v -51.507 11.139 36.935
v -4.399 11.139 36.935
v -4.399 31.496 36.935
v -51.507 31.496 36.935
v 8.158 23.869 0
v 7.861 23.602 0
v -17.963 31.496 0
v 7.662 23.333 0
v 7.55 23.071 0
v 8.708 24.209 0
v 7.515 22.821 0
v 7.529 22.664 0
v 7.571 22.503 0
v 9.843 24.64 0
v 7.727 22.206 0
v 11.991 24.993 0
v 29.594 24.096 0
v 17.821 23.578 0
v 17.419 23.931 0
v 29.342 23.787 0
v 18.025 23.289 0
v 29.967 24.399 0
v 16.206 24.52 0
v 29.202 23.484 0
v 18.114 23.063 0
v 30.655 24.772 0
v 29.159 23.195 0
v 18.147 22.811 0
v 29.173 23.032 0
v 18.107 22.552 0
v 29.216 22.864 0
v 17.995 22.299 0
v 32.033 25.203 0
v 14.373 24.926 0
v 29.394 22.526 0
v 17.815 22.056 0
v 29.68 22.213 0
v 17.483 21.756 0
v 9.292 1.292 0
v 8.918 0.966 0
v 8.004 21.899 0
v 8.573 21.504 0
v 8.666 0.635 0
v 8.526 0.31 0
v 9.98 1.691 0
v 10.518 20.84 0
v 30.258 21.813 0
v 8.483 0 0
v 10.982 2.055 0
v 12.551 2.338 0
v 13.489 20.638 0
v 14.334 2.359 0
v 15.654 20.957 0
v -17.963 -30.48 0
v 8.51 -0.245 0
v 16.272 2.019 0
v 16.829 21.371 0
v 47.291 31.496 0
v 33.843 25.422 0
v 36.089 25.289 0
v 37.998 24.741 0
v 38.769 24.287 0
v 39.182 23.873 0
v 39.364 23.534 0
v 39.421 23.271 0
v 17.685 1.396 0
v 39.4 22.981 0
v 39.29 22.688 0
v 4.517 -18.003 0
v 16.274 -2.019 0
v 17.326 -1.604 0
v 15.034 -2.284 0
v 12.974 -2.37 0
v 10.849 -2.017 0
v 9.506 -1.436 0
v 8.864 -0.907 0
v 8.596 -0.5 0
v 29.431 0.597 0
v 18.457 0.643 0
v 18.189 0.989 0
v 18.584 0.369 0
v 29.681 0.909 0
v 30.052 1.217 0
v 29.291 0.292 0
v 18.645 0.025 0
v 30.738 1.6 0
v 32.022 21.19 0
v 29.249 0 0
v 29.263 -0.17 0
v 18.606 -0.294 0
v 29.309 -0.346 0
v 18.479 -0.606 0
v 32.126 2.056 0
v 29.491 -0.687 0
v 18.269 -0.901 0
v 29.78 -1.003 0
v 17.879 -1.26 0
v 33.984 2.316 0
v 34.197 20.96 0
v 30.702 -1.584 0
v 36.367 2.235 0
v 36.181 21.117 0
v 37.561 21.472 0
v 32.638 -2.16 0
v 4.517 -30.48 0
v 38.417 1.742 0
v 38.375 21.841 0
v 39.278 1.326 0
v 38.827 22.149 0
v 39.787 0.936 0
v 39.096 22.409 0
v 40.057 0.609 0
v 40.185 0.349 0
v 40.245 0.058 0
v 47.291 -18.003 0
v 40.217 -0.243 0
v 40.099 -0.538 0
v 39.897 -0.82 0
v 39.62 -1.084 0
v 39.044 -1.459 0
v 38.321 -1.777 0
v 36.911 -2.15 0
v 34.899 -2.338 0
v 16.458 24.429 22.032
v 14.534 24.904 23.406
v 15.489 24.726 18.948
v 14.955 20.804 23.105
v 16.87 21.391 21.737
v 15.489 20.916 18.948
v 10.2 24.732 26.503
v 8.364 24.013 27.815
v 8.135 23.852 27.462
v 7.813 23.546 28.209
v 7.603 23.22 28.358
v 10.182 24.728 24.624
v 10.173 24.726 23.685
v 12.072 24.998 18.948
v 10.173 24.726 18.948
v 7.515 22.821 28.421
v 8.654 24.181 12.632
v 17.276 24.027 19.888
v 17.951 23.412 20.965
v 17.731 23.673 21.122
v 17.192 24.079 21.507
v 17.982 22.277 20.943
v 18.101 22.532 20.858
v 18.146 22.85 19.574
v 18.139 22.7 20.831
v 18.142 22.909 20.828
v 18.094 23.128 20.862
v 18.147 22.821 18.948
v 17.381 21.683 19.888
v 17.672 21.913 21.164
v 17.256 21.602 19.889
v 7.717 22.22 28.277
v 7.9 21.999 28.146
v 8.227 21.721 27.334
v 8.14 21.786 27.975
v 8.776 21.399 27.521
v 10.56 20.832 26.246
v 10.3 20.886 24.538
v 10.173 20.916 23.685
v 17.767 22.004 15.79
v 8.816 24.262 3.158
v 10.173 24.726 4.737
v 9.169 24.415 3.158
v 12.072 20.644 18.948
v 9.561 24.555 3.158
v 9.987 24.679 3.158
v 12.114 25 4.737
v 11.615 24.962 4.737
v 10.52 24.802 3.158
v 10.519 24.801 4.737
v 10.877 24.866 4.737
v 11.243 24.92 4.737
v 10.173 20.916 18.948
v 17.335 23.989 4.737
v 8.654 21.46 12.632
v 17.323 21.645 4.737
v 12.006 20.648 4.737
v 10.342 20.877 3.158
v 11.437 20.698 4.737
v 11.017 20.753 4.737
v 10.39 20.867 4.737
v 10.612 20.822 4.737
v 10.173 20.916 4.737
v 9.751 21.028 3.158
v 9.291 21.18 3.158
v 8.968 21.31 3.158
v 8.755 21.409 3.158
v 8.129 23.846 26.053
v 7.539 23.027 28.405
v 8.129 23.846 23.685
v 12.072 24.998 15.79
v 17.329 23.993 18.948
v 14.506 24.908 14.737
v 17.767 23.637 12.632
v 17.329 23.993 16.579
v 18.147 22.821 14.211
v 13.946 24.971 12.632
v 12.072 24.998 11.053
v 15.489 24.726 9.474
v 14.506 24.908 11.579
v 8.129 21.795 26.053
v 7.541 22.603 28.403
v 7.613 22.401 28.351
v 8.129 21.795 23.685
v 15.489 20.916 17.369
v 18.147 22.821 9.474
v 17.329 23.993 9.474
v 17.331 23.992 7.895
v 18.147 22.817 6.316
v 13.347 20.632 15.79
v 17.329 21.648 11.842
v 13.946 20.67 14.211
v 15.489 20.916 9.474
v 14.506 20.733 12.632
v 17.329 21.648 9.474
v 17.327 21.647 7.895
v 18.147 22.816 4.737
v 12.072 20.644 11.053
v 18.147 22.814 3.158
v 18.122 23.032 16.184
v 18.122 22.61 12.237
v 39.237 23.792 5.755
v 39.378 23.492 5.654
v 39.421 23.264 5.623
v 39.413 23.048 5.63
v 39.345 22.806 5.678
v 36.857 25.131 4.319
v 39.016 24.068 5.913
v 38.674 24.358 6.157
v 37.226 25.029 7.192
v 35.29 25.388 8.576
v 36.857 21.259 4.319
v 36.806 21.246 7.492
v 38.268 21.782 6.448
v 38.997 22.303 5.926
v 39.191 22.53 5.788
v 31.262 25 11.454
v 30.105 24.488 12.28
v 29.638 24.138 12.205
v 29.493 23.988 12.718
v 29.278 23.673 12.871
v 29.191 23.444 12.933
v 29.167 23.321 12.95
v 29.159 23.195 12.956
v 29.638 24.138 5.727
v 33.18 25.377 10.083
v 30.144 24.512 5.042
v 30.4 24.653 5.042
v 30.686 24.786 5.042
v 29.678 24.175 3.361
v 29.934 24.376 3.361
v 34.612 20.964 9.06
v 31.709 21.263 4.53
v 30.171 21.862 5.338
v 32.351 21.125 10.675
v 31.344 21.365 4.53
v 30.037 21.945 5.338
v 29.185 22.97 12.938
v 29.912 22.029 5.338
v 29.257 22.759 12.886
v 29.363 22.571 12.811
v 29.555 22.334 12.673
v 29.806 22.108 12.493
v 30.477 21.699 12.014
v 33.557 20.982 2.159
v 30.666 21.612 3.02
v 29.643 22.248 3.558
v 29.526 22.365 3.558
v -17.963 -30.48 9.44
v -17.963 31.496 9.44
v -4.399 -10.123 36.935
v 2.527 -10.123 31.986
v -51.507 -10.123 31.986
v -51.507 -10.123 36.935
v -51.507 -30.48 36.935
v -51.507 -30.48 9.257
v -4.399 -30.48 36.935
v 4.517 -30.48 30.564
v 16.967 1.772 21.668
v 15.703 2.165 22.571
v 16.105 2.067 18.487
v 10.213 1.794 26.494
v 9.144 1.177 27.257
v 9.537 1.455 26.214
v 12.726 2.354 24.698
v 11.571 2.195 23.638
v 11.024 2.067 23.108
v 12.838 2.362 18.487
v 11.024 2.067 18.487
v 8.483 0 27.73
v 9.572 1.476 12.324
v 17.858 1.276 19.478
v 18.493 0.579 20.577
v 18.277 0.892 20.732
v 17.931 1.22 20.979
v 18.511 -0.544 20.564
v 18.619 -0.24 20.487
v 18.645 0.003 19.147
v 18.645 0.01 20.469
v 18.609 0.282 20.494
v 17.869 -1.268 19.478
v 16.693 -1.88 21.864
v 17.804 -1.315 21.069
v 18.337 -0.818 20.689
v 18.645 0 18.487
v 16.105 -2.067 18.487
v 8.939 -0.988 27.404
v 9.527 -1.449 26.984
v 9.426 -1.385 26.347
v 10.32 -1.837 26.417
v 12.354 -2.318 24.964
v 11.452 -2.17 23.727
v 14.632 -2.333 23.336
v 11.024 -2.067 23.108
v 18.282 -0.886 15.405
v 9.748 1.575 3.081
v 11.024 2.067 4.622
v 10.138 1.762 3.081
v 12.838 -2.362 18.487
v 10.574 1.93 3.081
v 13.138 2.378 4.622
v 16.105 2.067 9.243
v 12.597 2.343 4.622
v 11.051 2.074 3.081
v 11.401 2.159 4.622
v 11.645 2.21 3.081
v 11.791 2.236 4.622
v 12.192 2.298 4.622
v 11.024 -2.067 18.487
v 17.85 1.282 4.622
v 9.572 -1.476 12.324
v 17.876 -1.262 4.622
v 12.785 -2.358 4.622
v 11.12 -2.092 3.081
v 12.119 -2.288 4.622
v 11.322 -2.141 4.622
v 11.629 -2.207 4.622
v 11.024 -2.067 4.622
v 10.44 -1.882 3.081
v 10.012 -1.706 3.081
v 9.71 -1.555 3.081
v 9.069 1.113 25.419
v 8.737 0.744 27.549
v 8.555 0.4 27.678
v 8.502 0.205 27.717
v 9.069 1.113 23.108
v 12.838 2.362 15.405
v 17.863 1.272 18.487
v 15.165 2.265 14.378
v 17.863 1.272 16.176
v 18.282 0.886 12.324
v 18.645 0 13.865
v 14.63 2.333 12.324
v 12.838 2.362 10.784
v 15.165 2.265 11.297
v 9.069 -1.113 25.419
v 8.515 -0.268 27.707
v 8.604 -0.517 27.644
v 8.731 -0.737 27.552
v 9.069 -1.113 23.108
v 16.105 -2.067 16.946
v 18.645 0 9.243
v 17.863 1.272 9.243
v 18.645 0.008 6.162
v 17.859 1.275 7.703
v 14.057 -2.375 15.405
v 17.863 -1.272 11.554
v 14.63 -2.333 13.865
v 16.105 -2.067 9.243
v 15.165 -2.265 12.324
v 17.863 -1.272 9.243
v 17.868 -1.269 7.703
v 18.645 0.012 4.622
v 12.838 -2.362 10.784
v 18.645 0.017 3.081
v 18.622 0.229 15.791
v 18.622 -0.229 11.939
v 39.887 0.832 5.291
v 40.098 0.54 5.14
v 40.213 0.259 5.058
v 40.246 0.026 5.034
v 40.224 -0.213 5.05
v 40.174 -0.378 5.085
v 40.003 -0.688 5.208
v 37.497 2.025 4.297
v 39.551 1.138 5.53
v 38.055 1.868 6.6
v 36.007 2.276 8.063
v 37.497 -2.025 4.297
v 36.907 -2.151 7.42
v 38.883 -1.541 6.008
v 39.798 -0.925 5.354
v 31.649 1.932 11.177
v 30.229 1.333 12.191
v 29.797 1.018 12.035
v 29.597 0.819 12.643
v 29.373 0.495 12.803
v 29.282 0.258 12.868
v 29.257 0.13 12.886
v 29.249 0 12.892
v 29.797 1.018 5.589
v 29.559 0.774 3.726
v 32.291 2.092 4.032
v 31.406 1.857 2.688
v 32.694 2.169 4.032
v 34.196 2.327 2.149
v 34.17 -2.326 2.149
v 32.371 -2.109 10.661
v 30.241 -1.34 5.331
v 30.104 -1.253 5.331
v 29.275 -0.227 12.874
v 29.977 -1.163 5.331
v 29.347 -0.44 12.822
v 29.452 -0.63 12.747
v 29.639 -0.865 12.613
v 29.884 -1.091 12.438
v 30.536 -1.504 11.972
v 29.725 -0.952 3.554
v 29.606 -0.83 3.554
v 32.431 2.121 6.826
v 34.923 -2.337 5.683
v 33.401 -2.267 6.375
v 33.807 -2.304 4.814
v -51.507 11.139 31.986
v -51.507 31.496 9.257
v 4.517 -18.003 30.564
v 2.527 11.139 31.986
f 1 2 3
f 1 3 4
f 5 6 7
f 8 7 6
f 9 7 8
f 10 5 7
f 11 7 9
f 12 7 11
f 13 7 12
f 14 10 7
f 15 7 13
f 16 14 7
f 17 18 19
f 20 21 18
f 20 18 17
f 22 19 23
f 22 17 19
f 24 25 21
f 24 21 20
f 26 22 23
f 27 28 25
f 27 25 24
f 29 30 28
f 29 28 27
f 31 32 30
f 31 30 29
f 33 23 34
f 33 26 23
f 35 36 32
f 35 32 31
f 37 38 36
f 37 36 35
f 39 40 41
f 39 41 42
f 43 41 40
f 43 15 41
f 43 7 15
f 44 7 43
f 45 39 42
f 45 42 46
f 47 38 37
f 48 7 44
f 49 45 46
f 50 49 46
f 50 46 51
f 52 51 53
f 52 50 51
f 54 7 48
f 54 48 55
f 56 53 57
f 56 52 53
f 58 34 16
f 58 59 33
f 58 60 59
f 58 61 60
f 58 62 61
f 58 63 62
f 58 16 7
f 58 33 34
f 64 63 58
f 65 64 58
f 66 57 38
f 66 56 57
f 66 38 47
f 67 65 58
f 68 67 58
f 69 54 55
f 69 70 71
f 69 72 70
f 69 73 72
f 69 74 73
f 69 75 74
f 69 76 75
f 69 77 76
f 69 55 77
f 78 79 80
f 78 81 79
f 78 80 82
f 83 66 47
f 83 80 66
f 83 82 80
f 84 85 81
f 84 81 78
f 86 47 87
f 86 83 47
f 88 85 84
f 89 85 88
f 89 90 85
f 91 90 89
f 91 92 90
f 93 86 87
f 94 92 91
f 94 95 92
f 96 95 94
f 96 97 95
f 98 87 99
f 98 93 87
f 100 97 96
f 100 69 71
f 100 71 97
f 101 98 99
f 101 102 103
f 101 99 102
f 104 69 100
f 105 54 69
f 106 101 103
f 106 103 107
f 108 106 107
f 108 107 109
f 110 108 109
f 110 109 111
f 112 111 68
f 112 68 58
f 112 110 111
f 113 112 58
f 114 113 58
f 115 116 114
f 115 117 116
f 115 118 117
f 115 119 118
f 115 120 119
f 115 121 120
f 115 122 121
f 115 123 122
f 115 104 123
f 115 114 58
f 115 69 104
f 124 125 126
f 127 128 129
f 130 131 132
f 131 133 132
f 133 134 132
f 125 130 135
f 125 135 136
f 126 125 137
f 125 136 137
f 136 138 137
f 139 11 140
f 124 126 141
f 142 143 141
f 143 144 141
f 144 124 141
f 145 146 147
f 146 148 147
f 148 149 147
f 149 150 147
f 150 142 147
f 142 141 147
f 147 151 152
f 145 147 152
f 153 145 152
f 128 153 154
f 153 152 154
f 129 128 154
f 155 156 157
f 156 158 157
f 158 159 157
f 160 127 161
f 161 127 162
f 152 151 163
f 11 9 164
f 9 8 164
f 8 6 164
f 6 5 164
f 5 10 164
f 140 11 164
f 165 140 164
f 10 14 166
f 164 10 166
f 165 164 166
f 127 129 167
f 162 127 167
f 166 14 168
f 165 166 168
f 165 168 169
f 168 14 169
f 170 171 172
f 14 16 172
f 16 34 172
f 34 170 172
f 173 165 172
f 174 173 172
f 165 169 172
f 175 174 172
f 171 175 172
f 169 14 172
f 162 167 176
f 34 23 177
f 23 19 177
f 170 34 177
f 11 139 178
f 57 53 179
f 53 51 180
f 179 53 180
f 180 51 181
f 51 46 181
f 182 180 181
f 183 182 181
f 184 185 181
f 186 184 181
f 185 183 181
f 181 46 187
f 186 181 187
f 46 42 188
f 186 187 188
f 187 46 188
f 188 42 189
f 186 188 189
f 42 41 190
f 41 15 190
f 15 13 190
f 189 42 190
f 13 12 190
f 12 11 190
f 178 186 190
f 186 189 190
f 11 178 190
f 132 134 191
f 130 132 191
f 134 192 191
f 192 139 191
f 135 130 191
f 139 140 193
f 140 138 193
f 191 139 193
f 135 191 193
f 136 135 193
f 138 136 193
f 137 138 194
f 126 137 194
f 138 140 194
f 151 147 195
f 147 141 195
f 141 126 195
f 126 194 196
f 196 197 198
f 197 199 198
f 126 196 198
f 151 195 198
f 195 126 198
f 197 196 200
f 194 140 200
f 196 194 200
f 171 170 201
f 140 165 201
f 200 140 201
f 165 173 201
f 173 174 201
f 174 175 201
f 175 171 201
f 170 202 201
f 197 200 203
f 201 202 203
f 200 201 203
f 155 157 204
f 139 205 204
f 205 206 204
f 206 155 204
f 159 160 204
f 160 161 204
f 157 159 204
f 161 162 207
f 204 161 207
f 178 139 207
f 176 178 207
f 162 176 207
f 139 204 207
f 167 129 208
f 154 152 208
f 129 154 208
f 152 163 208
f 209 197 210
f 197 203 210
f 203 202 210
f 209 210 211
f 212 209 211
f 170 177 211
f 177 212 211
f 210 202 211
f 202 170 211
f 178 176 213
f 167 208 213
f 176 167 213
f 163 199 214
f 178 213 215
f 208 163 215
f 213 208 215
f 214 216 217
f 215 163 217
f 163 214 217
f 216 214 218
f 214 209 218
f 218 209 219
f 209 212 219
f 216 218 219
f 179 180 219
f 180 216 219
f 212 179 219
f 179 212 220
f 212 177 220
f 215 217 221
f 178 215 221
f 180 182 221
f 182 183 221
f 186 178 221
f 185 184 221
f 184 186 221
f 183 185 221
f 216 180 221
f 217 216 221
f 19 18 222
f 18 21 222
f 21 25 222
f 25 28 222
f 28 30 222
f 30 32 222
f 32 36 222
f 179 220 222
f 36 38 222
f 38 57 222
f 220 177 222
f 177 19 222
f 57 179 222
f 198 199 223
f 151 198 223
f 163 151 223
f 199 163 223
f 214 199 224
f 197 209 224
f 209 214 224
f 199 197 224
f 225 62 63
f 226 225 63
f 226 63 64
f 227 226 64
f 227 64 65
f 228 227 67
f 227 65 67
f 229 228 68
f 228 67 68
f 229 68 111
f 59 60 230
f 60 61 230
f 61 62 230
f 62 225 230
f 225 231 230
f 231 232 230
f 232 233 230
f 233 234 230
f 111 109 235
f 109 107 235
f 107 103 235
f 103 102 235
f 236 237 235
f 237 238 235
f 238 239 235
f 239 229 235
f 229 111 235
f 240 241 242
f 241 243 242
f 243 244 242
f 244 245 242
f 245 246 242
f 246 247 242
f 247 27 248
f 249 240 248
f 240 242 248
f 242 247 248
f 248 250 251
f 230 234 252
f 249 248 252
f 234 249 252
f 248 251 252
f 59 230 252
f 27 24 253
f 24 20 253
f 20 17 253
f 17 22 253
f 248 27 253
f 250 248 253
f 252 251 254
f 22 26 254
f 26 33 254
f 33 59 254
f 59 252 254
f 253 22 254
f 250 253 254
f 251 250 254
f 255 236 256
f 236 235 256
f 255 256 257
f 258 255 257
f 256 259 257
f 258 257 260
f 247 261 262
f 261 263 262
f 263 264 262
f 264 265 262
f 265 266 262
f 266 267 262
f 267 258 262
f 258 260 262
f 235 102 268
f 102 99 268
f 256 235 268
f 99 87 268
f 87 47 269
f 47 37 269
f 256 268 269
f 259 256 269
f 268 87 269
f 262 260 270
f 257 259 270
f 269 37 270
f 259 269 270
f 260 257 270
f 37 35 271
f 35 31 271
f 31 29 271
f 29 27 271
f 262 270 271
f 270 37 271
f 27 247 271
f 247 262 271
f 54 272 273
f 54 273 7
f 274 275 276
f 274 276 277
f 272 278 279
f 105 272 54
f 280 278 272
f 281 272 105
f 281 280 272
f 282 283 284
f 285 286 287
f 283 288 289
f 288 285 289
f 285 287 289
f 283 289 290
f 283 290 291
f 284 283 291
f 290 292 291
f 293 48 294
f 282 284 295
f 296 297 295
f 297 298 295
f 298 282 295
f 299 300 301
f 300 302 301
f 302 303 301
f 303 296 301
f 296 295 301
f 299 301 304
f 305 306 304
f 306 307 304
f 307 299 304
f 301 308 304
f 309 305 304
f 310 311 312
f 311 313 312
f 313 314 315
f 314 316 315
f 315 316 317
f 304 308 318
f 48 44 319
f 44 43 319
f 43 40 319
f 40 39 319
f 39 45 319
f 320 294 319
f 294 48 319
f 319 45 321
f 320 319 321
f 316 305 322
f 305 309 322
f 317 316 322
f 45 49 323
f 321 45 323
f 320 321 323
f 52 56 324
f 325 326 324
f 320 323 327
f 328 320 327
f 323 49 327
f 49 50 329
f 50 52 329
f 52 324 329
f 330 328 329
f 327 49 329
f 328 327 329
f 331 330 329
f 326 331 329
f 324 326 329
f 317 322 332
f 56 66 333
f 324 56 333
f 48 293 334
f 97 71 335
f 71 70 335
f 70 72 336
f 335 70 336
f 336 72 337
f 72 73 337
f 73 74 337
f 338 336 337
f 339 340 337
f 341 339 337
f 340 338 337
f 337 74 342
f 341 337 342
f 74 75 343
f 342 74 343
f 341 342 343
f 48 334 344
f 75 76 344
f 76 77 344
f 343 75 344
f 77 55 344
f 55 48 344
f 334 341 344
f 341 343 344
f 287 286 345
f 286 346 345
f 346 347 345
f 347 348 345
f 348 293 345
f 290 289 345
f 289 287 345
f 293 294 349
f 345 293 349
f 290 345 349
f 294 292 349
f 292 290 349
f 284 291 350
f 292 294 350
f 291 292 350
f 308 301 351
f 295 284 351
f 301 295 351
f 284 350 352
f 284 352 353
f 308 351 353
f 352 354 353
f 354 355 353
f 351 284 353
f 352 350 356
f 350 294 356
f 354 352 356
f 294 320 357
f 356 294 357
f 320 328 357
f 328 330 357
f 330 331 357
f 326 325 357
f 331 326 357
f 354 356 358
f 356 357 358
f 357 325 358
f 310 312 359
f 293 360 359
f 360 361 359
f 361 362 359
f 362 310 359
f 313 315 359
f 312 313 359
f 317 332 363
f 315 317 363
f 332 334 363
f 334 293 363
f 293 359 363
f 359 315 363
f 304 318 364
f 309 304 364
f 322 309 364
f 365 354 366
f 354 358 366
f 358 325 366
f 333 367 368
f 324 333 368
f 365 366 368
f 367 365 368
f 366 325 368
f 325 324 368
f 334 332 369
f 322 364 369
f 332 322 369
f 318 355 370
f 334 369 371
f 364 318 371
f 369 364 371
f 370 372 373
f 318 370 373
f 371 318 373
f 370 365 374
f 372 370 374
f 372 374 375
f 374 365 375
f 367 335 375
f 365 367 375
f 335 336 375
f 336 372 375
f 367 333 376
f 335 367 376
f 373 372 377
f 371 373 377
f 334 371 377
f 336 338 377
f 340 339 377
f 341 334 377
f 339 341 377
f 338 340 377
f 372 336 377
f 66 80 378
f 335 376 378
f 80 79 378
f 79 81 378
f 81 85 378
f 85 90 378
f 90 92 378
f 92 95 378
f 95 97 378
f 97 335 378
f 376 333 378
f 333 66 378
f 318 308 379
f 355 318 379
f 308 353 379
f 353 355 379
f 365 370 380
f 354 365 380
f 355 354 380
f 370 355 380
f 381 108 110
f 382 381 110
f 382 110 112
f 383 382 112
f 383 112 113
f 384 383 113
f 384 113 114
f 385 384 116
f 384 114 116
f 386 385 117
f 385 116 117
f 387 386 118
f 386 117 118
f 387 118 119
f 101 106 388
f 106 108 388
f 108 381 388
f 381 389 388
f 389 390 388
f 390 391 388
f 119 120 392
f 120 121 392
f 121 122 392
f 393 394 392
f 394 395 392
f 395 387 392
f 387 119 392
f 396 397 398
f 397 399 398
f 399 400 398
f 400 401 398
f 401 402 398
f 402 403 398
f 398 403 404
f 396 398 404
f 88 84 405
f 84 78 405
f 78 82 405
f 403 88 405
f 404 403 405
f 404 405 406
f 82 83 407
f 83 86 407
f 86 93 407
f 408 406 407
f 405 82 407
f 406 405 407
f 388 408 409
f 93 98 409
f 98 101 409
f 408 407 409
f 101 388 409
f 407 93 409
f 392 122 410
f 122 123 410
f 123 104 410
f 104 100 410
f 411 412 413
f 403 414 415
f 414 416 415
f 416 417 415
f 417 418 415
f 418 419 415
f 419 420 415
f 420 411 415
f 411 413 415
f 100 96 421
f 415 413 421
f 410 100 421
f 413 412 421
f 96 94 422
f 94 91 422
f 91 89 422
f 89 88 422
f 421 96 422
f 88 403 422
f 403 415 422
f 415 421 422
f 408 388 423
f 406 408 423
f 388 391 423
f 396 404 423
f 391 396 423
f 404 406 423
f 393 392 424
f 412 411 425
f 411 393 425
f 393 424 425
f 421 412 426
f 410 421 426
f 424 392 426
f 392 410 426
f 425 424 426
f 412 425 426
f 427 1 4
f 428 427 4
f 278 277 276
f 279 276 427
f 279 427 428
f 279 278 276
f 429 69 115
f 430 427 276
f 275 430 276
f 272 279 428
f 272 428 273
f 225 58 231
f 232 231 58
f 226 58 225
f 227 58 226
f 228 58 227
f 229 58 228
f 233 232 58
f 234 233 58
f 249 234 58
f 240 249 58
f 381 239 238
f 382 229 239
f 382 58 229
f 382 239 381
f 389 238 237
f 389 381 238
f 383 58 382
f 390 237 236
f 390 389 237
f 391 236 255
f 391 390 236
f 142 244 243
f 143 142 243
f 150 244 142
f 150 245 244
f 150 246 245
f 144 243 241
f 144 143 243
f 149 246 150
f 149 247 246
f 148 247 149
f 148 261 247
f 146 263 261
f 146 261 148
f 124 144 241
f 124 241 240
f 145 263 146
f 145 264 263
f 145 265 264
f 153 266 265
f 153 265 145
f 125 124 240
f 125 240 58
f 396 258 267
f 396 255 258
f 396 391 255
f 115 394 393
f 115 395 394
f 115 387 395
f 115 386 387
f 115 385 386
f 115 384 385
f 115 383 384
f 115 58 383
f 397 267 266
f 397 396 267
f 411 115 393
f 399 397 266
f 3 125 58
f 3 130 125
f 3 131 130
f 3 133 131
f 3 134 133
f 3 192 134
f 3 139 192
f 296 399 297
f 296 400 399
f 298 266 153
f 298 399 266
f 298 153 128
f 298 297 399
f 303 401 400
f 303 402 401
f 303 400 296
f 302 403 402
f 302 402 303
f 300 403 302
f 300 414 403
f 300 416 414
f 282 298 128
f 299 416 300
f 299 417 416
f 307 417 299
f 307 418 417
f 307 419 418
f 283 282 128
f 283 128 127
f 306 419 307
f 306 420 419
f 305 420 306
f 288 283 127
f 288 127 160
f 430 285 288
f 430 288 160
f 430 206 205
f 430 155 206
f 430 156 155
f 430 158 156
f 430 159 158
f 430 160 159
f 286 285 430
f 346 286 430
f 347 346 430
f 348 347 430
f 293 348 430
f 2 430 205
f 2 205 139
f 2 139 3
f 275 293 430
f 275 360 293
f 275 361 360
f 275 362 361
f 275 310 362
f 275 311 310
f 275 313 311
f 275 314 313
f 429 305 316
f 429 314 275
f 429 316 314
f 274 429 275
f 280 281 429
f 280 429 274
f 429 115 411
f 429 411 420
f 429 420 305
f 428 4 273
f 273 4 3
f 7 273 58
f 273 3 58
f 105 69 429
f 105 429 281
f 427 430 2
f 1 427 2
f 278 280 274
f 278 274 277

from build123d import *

# Parameters (mm, degrees)
F1_DEPTH      = 30.48
F1_DEPTH_BACK = 31.496
F2_W          = 21.2626811117
F2_H          = 4.9490742385
F3_DEPTH      = 62.23
F4_W          = 42.7741259336
F4_H          = 12.4774224401
F5_DEPTH      = 50.038
F7_DEPTH      = 40.386


with BuildPart() as f1:
    # F0 (on Front) → F1 (new body, two sides)
    with BuildSketch(Plane.XZ) as f1_sk:
        Polygon((-51.5070110559, 36.9347445667), (-51.5070110559, 9.2565976083), (-17.9632995278, 9.4398977235), (-17.9632995278, 0), (47.2911335528, 0), (-4.39917529, 36.9347445667), (-39.2259806395, 36.9347445667), align=None)
    extrude(amount=F1_DEPTH)
    extrude(f1_sk.sketch, amount=-F1_DEPTH_BACK)

    # F2 (on face) → F3 (cut)
    with BuildSketch(Plane(origin=(-51.5070110559, 0, 0), x_dir=(0, -1, 0), z_dir=(-1, 0, 0))):
        with Locations((-0.508, 34.4602074474)):
            Rectangle(F2_W, F2_H)
    extrude(amount=-F3_DEPTH, mode=Mode.SUBTRACT)

    # F4 (on face) → F5 (cut)
    with BuildSketch(Plane(origin=(0, 0, 0), x_dir=(1, 0, 0), z_dir=(0, 0, -1))):
        with Locations((25.904070586, 24.24128878)):
            Rectangle(F4_W, F4_H)
    extrude(amount=-F5_DEPTH, mode=Mode.SUBTRACT)

    # F6 (on face) → F7 (cut)
    with BuildSketch(Plane(origin=(0, 0, 0), x_dir=(1, 0, 0), z_dir=(0, 0, -1))):
        with BuildLine():
            add(Edge.make_bspline(
                [(8.4830916408, 0), (8.4830916408, -4.1333669656), (16.1046412347, -2.0666834828), (23.7261908286, 0), (16.1046412347, 2.0666834828), (8.4830916408, 4.1333669656), (8.4830916408, 0)],
                knots=[0, 0, 0, 2.0943951024, 2.0943951024, 4.1887902048, 4.1887902048, 6.2831853072, 6.2831853072, 6.2831853072], degree=2, weights=[1, 0.5, 1, 0.5, 1, 0.5, 1]))
        make_face()
        with BuildLine():
            add(Edge.make_bspline(
                [(7.5152562931, -22.8207223117), (7.5152562931, -26.6305194653), (15.4887624085, -24.7256208885), (23.4622685239, -22.8207223117), (15.4887624085, -20.9158237349), (7.5152562931, -19.0109251582), (7.5152562931, -22.8207223117)],
                knots=[0, 0, 0, 2.0943951024, 2.0943951024, 4.1887902048, 4.1887902048, 6.2831853072, 6.2831853072, 6.2831853072], degree=2, weights=[1, 0.5, 1, 0.5, 1, 0.5, 1]))
        make_face()
        with BuildLine():
            add(Edge.make_bspline(
                [(29.1589088738, -23.1949742883), (29.1589088738, -27.0670063105), (36.8574578315, -25.1309902994), (44.5560067892, -23.1949742883), (36.8574578315, -21.2589582773), (29.1589088738, -19.3229422662), (29.1589088738, -23.1949742883)],
                knots=[0, 0, 0, 2.0943951024, 2.0943951024, 4.1887902048, 4.1887902048, 6.2831853072, 6.2831853072, 6.2831853072], degree=2, weights=[1, 0.5, 1, 0.5, 1, 0.5, 1]))
        make_face()
        with BuildLine():
            add(Edge.make_bspline(
                [(29.2485039681, 0), (29.2485039681, -4.0503729429), (37.4969588593, -2.0251864715), (45.7454137504, 0), (37.4969588593, 2.0251864715), (29.2485039681, 4.0503729429), (29.2485039681, 0)],
                knots=[0, 0, 0, 2.0943951024, 2.0943951024, 4.1887902048, 4.1887902048, 6.2831853072, 6.2831853072, 6.2831853072], degree=2, weights=[1, 0.5, 1, 0.5, 1, 0.5, 1]))
        make_face()
    extrude(amount=-F7_DEPTH, mode=Mode.SUBTRACT)


solid = f1.part
